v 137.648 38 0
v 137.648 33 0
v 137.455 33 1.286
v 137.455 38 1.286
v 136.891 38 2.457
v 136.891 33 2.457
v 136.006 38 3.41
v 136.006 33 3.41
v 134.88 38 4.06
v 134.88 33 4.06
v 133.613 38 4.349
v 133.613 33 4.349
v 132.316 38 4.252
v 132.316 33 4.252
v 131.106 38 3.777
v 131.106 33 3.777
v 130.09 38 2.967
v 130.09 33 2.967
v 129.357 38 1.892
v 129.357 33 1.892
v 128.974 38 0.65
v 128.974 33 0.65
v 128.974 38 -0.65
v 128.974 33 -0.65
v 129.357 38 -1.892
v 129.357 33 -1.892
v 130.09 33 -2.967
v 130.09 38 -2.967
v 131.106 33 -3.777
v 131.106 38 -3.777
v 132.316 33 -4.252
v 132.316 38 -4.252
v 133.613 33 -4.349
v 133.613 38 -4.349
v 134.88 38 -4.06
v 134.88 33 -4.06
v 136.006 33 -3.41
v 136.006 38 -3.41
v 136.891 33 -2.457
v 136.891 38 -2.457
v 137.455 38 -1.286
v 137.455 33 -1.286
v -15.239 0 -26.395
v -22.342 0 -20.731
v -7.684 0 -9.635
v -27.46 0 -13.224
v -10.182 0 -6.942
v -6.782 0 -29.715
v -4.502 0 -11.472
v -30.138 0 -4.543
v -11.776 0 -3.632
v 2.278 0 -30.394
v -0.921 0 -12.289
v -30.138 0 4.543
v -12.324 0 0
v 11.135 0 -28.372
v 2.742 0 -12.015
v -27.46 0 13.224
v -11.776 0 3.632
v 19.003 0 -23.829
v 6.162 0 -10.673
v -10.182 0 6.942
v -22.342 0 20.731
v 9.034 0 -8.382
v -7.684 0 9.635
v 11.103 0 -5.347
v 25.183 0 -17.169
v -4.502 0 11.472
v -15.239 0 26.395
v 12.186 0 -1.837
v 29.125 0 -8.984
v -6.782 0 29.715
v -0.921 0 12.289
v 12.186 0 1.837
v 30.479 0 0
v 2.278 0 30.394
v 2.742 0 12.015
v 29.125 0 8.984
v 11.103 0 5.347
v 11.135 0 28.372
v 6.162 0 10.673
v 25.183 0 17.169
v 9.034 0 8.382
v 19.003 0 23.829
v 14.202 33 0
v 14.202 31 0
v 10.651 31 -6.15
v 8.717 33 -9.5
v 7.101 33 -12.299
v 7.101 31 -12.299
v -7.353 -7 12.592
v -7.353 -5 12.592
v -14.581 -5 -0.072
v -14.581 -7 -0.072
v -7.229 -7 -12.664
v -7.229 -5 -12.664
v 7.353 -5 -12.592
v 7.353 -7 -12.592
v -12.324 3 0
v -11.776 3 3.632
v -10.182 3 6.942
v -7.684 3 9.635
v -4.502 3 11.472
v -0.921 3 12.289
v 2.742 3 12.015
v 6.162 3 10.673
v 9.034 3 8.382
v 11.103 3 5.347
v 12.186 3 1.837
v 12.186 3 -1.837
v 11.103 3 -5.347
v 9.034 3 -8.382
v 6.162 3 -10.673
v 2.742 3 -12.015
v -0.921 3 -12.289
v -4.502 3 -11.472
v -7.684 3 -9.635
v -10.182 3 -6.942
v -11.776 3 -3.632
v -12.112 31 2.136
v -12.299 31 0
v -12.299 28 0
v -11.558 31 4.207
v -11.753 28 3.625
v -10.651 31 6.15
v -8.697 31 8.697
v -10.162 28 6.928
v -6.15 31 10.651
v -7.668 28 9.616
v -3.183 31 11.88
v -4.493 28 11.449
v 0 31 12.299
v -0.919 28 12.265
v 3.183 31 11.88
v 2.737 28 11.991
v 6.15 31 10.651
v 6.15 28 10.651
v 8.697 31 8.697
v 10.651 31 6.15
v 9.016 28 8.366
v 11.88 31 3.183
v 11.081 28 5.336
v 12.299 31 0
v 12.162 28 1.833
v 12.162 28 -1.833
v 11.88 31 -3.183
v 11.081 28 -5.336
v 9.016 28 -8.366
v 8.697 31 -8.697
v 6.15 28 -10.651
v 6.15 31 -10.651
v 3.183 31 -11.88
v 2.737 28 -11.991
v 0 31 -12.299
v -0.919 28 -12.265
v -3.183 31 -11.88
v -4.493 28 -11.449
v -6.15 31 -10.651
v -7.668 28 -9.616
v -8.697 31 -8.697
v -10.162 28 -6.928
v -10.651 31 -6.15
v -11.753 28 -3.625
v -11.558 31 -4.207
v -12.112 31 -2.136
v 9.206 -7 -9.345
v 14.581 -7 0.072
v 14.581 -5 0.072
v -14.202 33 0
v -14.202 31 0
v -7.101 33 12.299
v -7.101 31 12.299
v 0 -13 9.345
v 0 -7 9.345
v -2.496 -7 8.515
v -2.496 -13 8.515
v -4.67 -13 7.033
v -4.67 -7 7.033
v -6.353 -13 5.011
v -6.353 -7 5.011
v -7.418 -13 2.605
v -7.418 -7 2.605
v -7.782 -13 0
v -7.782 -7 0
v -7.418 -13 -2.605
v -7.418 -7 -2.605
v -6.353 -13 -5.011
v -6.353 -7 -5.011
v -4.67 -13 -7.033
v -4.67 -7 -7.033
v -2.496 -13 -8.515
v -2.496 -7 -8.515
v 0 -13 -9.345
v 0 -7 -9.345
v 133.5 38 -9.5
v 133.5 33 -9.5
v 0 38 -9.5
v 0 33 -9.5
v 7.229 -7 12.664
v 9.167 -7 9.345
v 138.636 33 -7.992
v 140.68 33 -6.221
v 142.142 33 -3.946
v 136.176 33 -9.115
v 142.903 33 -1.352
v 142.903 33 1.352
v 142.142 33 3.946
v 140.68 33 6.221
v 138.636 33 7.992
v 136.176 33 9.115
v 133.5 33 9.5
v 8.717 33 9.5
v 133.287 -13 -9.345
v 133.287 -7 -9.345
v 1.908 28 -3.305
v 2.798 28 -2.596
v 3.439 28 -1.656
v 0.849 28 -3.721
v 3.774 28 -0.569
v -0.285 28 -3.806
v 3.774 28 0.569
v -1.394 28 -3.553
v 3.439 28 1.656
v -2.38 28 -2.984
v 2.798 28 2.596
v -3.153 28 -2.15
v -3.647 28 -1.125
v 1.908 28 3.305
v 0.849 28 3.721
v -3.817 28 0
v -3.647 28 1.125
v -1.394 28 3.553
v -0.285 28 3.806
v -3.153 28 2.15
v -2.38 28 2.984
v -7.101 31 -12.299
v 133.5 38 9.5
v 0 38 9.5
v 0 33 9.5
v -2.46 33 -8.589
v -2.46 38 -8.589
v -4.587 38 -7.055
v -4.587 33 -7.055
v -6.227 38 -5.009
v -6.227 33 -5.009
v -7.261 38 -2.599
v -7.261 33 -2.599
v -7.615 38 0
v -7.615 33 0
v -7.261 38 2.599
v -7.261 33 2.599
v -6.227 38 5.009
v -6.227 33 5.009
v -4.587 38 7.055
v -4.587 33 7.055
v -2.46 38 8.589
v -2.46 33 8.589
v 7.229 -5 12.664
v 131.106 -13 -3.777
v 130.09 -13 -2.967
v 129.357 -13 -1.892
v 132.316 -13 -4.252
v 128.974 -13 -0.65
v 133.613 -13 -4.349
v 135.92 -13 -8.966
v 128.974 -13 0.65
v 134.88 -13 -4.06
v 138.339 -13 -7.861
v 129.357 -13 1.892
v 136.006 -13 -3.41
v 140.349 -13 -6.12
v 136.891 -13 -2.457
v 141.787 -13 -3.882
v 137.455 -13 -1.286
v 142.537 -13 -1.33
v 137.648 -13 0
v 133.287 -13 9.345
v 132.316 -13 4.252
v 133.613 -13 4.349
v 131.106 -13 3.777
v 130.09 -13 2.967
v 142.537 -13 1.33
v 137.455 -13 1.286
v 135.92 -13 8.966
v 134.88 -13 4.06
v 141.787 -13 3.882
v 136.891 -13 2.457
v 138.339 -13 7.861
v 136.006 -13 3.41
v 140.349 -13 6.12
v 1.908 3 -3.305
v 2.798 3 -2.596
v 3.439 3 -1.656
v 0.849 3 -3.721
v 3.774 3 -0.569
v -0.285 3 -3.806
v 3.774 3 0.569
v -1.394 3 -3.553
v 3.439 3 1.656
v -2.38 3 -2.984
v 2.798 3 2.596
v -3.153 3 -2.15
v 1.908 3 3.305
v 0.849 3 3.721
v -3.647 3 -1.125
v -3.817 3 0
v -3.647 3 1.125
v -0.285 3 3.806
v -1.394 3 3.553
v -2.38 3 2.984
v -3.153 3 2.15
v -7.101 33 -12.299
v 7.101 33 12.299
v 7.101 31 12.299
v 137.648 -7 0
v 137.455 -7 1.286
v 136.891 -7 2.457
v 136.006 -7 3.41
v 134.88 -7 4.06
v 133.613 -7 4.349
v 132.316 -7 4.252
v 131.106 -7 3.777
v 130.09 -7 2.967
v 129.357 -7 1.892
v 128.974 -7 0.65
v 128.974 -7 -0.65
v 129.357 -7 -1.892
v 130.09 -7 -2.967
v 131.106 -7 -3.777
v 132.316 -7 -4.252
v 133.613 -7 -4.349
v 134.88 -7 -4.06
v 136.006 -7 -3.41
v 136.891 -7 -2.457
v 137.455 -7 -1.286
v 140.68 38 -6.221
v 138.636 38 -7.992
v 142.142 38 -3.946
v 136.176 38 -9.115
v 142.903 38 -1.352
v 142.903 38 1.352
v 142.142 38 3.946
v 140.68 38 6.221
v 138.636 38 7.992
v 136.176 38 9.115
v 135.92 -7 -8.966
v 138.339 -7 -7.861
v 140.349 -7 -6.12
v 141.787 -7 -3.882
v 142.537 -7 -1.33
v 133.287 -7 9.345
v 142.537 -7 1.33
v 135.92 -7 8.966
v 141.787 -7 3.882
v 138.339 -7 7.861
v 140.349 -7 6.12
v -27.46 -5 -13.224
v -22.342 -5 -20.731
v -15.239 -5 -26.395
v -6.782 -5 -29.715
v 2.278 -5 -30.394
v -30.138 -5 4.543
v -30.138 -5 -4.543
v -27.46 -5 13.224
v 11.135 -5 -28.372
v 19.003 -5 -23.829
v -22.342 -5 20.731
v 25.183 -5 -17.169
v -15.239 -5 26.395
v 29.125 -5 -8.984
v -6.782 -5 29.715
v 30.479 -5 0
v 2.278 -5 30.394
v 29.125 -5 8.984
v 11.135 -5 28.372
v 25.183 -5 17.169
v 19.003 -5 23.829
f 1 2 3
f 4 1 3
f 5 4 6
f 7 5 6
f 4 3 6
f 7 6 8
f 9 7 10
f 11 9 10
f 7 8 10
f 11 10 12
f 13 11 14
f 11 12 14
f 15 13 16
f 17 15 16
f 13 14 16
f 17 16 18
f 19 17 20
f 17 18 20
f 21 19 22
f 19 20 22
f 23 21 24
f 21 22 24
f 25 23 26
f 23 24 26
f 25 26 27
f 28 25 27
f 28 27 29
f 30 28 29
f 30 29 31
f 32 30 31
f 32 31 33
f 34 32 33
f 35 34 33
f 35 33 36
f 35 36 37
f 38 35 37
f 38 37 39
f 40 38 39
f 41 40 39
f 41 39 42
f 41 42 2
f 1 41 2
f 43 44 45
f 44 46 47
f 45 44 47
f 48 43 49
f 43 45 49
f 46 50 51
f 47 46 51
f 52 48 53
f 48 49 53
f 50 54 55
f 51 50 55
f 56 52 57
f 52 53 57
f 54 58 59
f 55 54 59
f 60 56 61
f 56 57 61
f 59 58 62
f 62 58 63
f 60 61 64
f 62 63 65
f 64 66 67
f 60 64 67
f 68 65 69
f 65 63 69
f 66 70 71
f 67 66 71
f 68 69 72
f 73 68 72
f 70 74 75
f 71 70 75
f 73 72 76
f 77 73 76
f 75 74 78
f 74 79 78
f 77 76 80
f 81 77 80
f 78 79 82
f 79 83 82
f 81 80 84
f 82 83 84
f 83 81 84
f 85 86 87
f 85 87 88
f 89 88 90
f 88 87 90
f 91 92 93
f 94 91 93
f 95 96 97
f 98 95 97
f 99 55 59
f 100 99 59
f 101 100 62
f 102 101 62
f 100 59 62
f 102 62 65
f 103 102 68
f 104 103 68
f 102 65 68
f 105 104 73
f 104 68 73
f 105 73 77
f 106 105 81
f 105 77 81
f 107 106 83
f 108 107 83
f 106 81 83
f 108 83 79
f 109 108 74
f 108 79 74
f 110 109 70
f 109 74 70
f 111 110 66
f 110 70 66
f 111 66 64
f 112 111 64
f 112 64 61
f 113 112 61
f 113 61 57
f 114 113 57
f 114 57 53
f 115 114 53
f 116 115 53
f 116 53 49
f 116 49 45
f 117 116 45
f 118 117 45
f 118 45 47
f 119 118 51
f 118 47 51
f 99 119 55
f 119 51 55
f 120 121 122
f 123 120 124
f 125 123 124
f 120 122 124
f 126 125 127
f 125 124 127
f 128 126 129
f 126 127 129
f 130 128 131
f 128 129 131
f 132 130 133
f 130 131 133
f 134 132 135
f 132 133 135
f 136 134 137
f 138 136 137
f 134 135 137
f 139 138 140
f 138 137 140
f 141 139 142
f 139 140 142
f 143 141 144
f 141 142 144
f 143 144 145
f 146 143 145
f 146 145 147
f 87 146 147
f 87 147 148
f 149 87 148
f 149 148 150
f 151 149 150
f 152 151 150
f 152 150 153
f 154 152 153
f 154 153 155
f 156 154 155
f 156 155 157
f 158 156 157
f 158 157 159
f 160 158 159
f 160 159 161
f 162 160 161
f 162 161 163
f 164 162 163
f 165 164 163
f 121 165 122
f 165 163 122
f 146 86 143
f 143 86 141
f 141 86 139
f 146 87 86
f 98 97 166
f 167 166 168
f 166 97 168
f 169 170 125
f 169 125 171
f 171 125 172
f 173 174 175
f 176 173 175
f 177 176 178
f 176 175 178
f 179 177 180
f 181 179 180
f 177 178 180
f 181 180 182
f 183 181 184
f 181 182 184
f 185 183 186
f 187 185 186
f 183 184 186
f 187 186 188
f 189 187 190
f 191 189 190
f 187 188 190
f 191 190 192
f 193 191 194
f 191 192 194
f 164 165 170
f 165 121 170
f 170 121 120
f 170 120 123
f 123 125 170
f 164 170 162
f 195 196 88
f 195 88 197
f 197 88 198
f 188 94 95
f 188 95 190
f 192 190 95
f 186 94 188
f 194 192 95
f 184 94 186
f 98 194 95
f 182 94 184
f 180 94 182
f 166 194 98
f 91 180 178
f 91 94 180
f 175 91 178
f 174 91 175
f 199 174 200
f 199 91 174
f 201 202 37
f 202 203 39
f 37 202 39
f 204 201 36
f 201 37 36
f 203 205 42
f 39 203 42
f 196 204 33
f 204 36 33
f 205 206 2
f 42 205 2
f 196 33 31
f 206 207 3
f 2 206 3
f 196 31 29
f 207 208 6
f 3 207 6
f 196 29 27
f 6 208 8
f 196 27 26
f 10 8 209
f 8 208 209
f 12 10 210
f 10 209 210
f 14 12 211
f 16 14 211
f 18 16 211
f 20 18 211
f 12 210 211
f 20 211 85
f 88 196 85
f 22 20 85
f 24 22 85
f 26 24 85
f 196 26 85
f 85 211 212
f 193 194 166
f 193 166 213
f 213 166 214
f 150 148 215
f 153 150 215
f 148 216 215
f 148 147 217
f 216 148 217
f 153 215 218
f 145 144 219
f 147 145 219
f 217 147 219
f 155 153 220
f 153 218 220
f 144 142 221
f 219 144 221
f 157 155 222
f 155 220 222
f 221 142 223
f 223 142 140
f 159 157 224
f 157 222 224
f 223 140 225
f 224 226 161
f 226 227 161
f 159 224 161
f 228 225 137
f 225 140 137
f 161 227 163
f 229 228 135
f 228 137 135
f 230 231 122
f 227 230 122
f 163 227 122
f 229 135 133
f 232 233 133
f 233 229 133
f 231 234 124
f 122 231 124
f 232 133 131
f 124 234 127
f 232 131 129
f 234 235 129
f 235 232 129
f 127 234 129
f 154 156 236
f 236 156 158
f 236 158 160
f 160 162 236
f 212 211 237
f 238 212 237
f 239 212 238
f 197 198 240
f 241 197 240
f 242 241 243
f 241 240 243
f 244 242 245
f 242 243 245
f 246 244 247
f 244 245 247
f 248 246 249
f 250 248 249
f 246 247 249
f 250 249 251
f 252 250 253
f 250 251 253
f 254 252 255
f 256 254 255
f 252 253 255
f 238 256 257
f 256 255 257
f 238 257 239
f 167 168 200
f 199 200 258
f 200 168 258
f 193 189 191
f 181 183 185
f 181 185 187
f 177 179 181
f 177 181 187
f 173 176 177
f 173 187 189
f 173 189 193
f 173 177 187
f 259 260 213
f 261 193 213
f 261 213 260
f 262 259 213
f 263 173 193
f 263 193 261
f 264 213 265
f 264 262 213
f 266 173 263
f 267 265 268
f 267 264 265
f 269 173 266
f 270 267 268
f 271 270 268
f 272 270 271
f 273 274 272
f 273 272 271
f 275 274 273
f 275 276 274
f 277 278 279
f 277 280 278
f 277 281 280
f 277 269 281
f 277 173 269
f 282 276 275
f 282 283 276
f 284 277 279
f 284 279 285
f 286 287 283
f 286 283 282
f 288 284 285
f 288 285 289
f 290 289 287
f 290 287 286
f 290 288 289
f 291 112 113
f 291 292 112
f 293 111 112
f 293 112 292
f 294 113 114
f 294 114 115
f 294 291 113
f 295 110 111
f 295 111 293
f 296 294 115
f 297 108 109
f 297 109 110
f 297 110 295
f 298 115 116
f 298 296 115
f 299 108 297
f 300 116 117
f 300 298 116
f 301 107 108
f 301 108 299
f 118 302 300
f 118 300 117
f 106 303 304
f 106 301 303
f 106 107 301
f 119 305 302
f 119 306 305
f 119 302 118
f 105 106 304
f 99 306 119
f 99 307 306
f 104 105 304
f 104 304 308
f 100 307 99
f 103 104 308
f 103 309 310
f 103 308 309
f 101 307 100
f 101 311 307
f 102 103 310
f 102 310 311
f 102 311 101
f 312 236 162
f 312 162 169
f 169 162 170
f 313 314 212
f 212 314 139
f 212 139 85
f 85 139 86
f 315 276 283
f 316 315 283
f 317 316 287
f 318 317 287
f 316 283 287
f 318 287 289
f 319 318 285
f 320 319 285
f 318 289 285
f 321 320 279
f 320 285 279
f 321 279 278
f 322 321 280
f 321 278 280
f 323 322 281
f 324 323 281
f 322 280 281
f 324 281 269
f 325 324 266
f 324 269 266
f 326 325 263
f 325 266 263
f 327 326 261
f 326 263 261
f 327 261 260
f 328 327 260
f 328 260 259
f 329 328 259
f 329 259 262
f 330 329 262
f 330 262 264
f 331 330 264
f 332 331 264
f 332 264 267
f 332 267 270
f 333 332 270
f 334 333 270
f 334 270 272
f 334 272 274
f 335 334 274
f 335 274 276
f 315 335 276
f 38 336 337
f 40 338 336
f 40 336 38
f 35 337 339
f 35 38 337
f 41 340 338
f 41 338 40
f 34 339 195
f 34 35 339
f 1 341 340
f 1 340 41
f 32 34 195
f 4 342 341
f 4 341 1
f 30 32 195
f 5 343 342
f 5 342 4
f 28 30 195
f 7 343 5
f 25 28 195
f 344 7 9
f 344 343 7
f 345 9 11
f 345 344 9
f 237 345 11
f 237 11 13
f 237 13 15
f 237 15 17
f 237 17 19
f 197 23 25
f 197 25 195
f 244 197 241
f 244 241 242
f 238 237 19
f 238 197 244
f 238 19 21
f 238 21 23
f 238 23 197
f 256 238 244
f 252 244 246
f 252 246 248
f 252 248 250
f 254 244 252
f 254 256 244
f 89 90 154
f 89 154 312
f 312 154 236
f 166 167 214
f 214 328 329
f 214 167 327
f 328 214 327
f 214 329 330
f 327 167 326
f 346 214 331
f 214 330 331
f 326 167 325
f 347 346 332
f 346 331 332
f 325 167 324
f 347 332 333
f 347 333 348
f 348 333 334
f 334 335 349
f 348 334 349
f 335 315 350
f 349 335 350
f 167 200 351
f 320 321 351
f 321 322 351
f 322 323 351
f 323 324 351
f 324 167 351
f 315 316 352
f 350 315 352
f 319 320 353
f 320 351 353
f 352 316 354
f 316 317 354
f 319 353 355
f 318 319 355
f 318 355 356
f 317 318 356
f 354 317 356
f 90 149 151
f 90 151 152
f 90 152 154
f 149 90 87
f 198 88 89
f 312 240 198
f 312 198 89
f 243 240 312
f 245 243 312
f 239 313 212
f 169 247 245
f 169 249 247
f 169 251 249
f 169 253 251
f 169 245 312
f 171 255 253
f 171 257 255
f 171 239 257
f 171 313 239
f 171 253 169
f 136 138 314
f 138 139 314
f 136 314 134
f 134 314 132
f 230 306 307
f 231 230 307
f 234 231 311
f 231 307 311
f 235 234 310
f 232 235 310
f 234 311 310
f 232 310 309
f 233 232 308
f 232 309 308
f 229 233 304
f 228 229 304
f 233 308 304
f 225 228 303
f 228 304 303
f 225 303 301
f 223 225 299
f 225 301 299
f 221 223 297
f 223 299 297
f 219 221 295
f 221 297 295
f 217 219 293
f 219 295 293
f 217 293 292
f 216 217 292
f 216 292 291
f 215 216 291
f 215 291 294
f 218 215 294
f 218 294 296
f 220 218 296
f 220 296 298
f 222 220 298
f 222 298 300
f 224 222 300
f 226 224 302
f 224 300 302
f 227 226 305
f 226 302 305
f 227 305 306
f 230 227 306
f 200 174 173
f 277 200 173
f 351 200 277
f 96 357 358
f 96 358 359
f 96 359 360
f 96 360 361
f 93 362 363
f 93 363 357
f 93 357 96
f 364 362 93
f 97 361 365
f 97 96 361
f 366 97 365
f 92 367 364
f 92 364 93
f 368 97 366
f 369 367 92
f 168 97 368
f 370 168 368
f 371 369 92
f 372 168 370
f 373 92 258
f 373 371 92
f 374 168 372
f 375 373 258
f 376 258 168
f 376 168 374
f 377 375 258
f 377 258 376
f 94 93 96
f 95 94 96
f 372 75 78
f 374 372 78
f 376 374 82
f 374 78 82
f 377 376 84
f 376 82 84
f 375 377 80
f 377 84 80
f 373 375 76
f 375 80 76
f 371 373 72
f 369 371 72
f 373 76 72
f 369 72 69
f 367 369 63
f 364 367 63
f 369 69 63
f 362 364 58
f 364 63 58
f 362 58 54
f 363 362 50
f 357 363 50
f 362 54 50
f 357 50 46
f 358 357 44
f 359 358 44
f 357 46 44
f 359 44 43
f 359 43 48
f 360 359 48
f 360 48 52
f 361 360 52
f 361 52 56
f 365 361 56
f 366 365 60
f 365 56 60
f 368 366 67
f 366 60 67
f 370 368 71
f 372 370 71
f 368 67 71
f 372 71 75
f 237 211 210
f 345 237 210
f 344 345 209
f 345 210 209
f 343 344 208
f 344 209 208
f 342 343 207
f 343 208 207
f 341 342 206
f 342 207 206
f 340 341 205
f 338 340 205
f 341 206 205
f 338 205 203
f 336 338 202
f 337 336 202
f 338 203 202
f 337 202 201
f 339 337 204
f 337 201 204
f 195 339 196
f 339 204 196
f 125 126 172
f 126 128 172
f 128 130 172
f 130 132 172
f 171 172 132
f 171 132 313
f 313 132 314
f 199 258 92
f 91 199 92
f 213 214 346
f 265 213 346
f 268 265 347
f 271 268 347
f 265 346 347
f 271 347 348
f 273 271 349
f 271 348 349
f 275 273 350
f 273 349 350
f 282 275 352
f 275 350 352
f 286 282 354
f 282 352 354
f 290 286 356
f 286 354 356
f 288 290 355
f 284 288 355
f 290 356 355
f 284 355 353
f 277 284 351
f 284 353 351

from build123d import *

# Parameters (mm, degrees)
F0_R      = 30.4787407236
F1_DEPTH  = 5
F2_R      = 12.323577598
F3_DEPTH  = 3
F4_R      = 3.8165326263
F5_DEPTH  = 25
F6_R      = 12.2992477122
F7_DEPTH  = 3
F9_DEPTH  = 2
F10_W     = 133.2869231701
F10_H     = 18.6895169318
F11_DEPTH = 6
F13_DEPTH = 2
F14_W     = 133.5
F14_H     = 19
F15_DEPTH = 5
F16_R     = 4.3615258045
F17_DEPTH = 55


with BuildPart() as f1:
    # F0 (on Front) → F1 (new body)
    with BuildSketch(Plane.XZ):
        Circle(F0_R)
    extrude(amount=F1_DEPTH)

    # F2 (on face) → F3 (join)
    with BuildSketch(Plane(origin=(0, 0, 0), x_dir=(-1, 0, 0), z_dir=(0, 1, 0))):
        Circle(F2_R)
    extrude(amount=F3_DEPTH)

    # F4 (on face) → F5 (join)
    with BuildSketch(Plane(origin=(0, 3, 0), x_dir=(-1, 0, 0), z_dir=(0, 1, 0))):
        Circle(F4_R)
    extrude(amount=F5_DEPTH)

    # F6 (on face) → F7 (join)
    with BuildSketch(Plane(origin=(0, 28, 0), x_dir=(-1, 0, 0), z_dir=(0, 1, 0))):
        Circle(F6_R)
    extrude(amount=F7_DEPTH)

    # F8 (on face) → F9 (join)
    with BuildSketch(Plane.XZ.offset(5)):
        Polygon((-7.3528563089, 12.591948495), (-14.5813754343, -0.0717861064), (-7.2285191254, -12.6637346014), (7.3528563089, -12.591948495), (14.5813754343, 0.0717861064), (7.2285191254, 12.6637346014), align=None)
    extrude(amount=F9_DEPTH)

    # F10 (on face) → F11 (join)
    with BuildSketch(Plane.XZ.offset(7)):
        with Locations((66.643461585, 0)):
            Rectangle(F10_W, F10_H)
        with BuildLine():
            Line((0, -9.3447584659), (0, 9.3447584659))
            ThreePointArc((0, 9.3447584659), (-7.7820729992, 0), (0, -9.3447584659))
        make_face()
        with BuildLine():
            ThreePointArc((133.2869231701, -9.3447584659), (142.631681636, 0), (133.2869231701, 9.3447584659))
            Line((133.2869231701, 9.3447584659), (133.2869231701, -9.3447584659))
        make_face()
    extrude(amount=F11_DEPTH)

    # F12 (on face) → F13 (join)
    with BuildSketch(Plane(origin=(0, 31, 0), x_dir=(-1, 0, 0), z_dir=(0, 1, 0))):
        Polygon((7.1009739775, 12.2992477122), (-7.1009739775, 12.2992477122), (-14.2019479549, 0), (-7.1009739775, -12.2992477122), (7.1009739775, -12.2992477122), (14.2019479549, 0), align=None)
    extrude(amount=F13_DEPTH)

    # F14 (on face) → F15 (join)
    with BuildSketch(Plane(origin=(0, 33, 0), x_dir=(-1, 0, 0), z_dir=(0, 1, 0))):
        with Locations((-66.75, 0)):
            Rectangle(F14_W, F14_H)
        with BuildLine():
            Line((0, 9.5), (0, -9.5))
            ThreePointArc((0, -9.5), (7.6147800585, 0), (0, 9.5))
        make_face()
        with BuildLine():
            ThreePointArc((-133.5, 9.5), (-143, 0), (-133.5, -9.5))
            Line((-133.5, -9.5), (-133.5, 9.5))
        make_face()
    extrude(amount=F15_DEPTH)

    # F16 (on face) → F17 (cut)
    with BuildSketch(Plane.XZ.offset(13)):
        with Locations((133.2869231701, 0)):
            Circle(F16_R)
    extrude(amount=-F17_DEPTH, mode=Mode.SUBTRACT)


solid = f1.part
